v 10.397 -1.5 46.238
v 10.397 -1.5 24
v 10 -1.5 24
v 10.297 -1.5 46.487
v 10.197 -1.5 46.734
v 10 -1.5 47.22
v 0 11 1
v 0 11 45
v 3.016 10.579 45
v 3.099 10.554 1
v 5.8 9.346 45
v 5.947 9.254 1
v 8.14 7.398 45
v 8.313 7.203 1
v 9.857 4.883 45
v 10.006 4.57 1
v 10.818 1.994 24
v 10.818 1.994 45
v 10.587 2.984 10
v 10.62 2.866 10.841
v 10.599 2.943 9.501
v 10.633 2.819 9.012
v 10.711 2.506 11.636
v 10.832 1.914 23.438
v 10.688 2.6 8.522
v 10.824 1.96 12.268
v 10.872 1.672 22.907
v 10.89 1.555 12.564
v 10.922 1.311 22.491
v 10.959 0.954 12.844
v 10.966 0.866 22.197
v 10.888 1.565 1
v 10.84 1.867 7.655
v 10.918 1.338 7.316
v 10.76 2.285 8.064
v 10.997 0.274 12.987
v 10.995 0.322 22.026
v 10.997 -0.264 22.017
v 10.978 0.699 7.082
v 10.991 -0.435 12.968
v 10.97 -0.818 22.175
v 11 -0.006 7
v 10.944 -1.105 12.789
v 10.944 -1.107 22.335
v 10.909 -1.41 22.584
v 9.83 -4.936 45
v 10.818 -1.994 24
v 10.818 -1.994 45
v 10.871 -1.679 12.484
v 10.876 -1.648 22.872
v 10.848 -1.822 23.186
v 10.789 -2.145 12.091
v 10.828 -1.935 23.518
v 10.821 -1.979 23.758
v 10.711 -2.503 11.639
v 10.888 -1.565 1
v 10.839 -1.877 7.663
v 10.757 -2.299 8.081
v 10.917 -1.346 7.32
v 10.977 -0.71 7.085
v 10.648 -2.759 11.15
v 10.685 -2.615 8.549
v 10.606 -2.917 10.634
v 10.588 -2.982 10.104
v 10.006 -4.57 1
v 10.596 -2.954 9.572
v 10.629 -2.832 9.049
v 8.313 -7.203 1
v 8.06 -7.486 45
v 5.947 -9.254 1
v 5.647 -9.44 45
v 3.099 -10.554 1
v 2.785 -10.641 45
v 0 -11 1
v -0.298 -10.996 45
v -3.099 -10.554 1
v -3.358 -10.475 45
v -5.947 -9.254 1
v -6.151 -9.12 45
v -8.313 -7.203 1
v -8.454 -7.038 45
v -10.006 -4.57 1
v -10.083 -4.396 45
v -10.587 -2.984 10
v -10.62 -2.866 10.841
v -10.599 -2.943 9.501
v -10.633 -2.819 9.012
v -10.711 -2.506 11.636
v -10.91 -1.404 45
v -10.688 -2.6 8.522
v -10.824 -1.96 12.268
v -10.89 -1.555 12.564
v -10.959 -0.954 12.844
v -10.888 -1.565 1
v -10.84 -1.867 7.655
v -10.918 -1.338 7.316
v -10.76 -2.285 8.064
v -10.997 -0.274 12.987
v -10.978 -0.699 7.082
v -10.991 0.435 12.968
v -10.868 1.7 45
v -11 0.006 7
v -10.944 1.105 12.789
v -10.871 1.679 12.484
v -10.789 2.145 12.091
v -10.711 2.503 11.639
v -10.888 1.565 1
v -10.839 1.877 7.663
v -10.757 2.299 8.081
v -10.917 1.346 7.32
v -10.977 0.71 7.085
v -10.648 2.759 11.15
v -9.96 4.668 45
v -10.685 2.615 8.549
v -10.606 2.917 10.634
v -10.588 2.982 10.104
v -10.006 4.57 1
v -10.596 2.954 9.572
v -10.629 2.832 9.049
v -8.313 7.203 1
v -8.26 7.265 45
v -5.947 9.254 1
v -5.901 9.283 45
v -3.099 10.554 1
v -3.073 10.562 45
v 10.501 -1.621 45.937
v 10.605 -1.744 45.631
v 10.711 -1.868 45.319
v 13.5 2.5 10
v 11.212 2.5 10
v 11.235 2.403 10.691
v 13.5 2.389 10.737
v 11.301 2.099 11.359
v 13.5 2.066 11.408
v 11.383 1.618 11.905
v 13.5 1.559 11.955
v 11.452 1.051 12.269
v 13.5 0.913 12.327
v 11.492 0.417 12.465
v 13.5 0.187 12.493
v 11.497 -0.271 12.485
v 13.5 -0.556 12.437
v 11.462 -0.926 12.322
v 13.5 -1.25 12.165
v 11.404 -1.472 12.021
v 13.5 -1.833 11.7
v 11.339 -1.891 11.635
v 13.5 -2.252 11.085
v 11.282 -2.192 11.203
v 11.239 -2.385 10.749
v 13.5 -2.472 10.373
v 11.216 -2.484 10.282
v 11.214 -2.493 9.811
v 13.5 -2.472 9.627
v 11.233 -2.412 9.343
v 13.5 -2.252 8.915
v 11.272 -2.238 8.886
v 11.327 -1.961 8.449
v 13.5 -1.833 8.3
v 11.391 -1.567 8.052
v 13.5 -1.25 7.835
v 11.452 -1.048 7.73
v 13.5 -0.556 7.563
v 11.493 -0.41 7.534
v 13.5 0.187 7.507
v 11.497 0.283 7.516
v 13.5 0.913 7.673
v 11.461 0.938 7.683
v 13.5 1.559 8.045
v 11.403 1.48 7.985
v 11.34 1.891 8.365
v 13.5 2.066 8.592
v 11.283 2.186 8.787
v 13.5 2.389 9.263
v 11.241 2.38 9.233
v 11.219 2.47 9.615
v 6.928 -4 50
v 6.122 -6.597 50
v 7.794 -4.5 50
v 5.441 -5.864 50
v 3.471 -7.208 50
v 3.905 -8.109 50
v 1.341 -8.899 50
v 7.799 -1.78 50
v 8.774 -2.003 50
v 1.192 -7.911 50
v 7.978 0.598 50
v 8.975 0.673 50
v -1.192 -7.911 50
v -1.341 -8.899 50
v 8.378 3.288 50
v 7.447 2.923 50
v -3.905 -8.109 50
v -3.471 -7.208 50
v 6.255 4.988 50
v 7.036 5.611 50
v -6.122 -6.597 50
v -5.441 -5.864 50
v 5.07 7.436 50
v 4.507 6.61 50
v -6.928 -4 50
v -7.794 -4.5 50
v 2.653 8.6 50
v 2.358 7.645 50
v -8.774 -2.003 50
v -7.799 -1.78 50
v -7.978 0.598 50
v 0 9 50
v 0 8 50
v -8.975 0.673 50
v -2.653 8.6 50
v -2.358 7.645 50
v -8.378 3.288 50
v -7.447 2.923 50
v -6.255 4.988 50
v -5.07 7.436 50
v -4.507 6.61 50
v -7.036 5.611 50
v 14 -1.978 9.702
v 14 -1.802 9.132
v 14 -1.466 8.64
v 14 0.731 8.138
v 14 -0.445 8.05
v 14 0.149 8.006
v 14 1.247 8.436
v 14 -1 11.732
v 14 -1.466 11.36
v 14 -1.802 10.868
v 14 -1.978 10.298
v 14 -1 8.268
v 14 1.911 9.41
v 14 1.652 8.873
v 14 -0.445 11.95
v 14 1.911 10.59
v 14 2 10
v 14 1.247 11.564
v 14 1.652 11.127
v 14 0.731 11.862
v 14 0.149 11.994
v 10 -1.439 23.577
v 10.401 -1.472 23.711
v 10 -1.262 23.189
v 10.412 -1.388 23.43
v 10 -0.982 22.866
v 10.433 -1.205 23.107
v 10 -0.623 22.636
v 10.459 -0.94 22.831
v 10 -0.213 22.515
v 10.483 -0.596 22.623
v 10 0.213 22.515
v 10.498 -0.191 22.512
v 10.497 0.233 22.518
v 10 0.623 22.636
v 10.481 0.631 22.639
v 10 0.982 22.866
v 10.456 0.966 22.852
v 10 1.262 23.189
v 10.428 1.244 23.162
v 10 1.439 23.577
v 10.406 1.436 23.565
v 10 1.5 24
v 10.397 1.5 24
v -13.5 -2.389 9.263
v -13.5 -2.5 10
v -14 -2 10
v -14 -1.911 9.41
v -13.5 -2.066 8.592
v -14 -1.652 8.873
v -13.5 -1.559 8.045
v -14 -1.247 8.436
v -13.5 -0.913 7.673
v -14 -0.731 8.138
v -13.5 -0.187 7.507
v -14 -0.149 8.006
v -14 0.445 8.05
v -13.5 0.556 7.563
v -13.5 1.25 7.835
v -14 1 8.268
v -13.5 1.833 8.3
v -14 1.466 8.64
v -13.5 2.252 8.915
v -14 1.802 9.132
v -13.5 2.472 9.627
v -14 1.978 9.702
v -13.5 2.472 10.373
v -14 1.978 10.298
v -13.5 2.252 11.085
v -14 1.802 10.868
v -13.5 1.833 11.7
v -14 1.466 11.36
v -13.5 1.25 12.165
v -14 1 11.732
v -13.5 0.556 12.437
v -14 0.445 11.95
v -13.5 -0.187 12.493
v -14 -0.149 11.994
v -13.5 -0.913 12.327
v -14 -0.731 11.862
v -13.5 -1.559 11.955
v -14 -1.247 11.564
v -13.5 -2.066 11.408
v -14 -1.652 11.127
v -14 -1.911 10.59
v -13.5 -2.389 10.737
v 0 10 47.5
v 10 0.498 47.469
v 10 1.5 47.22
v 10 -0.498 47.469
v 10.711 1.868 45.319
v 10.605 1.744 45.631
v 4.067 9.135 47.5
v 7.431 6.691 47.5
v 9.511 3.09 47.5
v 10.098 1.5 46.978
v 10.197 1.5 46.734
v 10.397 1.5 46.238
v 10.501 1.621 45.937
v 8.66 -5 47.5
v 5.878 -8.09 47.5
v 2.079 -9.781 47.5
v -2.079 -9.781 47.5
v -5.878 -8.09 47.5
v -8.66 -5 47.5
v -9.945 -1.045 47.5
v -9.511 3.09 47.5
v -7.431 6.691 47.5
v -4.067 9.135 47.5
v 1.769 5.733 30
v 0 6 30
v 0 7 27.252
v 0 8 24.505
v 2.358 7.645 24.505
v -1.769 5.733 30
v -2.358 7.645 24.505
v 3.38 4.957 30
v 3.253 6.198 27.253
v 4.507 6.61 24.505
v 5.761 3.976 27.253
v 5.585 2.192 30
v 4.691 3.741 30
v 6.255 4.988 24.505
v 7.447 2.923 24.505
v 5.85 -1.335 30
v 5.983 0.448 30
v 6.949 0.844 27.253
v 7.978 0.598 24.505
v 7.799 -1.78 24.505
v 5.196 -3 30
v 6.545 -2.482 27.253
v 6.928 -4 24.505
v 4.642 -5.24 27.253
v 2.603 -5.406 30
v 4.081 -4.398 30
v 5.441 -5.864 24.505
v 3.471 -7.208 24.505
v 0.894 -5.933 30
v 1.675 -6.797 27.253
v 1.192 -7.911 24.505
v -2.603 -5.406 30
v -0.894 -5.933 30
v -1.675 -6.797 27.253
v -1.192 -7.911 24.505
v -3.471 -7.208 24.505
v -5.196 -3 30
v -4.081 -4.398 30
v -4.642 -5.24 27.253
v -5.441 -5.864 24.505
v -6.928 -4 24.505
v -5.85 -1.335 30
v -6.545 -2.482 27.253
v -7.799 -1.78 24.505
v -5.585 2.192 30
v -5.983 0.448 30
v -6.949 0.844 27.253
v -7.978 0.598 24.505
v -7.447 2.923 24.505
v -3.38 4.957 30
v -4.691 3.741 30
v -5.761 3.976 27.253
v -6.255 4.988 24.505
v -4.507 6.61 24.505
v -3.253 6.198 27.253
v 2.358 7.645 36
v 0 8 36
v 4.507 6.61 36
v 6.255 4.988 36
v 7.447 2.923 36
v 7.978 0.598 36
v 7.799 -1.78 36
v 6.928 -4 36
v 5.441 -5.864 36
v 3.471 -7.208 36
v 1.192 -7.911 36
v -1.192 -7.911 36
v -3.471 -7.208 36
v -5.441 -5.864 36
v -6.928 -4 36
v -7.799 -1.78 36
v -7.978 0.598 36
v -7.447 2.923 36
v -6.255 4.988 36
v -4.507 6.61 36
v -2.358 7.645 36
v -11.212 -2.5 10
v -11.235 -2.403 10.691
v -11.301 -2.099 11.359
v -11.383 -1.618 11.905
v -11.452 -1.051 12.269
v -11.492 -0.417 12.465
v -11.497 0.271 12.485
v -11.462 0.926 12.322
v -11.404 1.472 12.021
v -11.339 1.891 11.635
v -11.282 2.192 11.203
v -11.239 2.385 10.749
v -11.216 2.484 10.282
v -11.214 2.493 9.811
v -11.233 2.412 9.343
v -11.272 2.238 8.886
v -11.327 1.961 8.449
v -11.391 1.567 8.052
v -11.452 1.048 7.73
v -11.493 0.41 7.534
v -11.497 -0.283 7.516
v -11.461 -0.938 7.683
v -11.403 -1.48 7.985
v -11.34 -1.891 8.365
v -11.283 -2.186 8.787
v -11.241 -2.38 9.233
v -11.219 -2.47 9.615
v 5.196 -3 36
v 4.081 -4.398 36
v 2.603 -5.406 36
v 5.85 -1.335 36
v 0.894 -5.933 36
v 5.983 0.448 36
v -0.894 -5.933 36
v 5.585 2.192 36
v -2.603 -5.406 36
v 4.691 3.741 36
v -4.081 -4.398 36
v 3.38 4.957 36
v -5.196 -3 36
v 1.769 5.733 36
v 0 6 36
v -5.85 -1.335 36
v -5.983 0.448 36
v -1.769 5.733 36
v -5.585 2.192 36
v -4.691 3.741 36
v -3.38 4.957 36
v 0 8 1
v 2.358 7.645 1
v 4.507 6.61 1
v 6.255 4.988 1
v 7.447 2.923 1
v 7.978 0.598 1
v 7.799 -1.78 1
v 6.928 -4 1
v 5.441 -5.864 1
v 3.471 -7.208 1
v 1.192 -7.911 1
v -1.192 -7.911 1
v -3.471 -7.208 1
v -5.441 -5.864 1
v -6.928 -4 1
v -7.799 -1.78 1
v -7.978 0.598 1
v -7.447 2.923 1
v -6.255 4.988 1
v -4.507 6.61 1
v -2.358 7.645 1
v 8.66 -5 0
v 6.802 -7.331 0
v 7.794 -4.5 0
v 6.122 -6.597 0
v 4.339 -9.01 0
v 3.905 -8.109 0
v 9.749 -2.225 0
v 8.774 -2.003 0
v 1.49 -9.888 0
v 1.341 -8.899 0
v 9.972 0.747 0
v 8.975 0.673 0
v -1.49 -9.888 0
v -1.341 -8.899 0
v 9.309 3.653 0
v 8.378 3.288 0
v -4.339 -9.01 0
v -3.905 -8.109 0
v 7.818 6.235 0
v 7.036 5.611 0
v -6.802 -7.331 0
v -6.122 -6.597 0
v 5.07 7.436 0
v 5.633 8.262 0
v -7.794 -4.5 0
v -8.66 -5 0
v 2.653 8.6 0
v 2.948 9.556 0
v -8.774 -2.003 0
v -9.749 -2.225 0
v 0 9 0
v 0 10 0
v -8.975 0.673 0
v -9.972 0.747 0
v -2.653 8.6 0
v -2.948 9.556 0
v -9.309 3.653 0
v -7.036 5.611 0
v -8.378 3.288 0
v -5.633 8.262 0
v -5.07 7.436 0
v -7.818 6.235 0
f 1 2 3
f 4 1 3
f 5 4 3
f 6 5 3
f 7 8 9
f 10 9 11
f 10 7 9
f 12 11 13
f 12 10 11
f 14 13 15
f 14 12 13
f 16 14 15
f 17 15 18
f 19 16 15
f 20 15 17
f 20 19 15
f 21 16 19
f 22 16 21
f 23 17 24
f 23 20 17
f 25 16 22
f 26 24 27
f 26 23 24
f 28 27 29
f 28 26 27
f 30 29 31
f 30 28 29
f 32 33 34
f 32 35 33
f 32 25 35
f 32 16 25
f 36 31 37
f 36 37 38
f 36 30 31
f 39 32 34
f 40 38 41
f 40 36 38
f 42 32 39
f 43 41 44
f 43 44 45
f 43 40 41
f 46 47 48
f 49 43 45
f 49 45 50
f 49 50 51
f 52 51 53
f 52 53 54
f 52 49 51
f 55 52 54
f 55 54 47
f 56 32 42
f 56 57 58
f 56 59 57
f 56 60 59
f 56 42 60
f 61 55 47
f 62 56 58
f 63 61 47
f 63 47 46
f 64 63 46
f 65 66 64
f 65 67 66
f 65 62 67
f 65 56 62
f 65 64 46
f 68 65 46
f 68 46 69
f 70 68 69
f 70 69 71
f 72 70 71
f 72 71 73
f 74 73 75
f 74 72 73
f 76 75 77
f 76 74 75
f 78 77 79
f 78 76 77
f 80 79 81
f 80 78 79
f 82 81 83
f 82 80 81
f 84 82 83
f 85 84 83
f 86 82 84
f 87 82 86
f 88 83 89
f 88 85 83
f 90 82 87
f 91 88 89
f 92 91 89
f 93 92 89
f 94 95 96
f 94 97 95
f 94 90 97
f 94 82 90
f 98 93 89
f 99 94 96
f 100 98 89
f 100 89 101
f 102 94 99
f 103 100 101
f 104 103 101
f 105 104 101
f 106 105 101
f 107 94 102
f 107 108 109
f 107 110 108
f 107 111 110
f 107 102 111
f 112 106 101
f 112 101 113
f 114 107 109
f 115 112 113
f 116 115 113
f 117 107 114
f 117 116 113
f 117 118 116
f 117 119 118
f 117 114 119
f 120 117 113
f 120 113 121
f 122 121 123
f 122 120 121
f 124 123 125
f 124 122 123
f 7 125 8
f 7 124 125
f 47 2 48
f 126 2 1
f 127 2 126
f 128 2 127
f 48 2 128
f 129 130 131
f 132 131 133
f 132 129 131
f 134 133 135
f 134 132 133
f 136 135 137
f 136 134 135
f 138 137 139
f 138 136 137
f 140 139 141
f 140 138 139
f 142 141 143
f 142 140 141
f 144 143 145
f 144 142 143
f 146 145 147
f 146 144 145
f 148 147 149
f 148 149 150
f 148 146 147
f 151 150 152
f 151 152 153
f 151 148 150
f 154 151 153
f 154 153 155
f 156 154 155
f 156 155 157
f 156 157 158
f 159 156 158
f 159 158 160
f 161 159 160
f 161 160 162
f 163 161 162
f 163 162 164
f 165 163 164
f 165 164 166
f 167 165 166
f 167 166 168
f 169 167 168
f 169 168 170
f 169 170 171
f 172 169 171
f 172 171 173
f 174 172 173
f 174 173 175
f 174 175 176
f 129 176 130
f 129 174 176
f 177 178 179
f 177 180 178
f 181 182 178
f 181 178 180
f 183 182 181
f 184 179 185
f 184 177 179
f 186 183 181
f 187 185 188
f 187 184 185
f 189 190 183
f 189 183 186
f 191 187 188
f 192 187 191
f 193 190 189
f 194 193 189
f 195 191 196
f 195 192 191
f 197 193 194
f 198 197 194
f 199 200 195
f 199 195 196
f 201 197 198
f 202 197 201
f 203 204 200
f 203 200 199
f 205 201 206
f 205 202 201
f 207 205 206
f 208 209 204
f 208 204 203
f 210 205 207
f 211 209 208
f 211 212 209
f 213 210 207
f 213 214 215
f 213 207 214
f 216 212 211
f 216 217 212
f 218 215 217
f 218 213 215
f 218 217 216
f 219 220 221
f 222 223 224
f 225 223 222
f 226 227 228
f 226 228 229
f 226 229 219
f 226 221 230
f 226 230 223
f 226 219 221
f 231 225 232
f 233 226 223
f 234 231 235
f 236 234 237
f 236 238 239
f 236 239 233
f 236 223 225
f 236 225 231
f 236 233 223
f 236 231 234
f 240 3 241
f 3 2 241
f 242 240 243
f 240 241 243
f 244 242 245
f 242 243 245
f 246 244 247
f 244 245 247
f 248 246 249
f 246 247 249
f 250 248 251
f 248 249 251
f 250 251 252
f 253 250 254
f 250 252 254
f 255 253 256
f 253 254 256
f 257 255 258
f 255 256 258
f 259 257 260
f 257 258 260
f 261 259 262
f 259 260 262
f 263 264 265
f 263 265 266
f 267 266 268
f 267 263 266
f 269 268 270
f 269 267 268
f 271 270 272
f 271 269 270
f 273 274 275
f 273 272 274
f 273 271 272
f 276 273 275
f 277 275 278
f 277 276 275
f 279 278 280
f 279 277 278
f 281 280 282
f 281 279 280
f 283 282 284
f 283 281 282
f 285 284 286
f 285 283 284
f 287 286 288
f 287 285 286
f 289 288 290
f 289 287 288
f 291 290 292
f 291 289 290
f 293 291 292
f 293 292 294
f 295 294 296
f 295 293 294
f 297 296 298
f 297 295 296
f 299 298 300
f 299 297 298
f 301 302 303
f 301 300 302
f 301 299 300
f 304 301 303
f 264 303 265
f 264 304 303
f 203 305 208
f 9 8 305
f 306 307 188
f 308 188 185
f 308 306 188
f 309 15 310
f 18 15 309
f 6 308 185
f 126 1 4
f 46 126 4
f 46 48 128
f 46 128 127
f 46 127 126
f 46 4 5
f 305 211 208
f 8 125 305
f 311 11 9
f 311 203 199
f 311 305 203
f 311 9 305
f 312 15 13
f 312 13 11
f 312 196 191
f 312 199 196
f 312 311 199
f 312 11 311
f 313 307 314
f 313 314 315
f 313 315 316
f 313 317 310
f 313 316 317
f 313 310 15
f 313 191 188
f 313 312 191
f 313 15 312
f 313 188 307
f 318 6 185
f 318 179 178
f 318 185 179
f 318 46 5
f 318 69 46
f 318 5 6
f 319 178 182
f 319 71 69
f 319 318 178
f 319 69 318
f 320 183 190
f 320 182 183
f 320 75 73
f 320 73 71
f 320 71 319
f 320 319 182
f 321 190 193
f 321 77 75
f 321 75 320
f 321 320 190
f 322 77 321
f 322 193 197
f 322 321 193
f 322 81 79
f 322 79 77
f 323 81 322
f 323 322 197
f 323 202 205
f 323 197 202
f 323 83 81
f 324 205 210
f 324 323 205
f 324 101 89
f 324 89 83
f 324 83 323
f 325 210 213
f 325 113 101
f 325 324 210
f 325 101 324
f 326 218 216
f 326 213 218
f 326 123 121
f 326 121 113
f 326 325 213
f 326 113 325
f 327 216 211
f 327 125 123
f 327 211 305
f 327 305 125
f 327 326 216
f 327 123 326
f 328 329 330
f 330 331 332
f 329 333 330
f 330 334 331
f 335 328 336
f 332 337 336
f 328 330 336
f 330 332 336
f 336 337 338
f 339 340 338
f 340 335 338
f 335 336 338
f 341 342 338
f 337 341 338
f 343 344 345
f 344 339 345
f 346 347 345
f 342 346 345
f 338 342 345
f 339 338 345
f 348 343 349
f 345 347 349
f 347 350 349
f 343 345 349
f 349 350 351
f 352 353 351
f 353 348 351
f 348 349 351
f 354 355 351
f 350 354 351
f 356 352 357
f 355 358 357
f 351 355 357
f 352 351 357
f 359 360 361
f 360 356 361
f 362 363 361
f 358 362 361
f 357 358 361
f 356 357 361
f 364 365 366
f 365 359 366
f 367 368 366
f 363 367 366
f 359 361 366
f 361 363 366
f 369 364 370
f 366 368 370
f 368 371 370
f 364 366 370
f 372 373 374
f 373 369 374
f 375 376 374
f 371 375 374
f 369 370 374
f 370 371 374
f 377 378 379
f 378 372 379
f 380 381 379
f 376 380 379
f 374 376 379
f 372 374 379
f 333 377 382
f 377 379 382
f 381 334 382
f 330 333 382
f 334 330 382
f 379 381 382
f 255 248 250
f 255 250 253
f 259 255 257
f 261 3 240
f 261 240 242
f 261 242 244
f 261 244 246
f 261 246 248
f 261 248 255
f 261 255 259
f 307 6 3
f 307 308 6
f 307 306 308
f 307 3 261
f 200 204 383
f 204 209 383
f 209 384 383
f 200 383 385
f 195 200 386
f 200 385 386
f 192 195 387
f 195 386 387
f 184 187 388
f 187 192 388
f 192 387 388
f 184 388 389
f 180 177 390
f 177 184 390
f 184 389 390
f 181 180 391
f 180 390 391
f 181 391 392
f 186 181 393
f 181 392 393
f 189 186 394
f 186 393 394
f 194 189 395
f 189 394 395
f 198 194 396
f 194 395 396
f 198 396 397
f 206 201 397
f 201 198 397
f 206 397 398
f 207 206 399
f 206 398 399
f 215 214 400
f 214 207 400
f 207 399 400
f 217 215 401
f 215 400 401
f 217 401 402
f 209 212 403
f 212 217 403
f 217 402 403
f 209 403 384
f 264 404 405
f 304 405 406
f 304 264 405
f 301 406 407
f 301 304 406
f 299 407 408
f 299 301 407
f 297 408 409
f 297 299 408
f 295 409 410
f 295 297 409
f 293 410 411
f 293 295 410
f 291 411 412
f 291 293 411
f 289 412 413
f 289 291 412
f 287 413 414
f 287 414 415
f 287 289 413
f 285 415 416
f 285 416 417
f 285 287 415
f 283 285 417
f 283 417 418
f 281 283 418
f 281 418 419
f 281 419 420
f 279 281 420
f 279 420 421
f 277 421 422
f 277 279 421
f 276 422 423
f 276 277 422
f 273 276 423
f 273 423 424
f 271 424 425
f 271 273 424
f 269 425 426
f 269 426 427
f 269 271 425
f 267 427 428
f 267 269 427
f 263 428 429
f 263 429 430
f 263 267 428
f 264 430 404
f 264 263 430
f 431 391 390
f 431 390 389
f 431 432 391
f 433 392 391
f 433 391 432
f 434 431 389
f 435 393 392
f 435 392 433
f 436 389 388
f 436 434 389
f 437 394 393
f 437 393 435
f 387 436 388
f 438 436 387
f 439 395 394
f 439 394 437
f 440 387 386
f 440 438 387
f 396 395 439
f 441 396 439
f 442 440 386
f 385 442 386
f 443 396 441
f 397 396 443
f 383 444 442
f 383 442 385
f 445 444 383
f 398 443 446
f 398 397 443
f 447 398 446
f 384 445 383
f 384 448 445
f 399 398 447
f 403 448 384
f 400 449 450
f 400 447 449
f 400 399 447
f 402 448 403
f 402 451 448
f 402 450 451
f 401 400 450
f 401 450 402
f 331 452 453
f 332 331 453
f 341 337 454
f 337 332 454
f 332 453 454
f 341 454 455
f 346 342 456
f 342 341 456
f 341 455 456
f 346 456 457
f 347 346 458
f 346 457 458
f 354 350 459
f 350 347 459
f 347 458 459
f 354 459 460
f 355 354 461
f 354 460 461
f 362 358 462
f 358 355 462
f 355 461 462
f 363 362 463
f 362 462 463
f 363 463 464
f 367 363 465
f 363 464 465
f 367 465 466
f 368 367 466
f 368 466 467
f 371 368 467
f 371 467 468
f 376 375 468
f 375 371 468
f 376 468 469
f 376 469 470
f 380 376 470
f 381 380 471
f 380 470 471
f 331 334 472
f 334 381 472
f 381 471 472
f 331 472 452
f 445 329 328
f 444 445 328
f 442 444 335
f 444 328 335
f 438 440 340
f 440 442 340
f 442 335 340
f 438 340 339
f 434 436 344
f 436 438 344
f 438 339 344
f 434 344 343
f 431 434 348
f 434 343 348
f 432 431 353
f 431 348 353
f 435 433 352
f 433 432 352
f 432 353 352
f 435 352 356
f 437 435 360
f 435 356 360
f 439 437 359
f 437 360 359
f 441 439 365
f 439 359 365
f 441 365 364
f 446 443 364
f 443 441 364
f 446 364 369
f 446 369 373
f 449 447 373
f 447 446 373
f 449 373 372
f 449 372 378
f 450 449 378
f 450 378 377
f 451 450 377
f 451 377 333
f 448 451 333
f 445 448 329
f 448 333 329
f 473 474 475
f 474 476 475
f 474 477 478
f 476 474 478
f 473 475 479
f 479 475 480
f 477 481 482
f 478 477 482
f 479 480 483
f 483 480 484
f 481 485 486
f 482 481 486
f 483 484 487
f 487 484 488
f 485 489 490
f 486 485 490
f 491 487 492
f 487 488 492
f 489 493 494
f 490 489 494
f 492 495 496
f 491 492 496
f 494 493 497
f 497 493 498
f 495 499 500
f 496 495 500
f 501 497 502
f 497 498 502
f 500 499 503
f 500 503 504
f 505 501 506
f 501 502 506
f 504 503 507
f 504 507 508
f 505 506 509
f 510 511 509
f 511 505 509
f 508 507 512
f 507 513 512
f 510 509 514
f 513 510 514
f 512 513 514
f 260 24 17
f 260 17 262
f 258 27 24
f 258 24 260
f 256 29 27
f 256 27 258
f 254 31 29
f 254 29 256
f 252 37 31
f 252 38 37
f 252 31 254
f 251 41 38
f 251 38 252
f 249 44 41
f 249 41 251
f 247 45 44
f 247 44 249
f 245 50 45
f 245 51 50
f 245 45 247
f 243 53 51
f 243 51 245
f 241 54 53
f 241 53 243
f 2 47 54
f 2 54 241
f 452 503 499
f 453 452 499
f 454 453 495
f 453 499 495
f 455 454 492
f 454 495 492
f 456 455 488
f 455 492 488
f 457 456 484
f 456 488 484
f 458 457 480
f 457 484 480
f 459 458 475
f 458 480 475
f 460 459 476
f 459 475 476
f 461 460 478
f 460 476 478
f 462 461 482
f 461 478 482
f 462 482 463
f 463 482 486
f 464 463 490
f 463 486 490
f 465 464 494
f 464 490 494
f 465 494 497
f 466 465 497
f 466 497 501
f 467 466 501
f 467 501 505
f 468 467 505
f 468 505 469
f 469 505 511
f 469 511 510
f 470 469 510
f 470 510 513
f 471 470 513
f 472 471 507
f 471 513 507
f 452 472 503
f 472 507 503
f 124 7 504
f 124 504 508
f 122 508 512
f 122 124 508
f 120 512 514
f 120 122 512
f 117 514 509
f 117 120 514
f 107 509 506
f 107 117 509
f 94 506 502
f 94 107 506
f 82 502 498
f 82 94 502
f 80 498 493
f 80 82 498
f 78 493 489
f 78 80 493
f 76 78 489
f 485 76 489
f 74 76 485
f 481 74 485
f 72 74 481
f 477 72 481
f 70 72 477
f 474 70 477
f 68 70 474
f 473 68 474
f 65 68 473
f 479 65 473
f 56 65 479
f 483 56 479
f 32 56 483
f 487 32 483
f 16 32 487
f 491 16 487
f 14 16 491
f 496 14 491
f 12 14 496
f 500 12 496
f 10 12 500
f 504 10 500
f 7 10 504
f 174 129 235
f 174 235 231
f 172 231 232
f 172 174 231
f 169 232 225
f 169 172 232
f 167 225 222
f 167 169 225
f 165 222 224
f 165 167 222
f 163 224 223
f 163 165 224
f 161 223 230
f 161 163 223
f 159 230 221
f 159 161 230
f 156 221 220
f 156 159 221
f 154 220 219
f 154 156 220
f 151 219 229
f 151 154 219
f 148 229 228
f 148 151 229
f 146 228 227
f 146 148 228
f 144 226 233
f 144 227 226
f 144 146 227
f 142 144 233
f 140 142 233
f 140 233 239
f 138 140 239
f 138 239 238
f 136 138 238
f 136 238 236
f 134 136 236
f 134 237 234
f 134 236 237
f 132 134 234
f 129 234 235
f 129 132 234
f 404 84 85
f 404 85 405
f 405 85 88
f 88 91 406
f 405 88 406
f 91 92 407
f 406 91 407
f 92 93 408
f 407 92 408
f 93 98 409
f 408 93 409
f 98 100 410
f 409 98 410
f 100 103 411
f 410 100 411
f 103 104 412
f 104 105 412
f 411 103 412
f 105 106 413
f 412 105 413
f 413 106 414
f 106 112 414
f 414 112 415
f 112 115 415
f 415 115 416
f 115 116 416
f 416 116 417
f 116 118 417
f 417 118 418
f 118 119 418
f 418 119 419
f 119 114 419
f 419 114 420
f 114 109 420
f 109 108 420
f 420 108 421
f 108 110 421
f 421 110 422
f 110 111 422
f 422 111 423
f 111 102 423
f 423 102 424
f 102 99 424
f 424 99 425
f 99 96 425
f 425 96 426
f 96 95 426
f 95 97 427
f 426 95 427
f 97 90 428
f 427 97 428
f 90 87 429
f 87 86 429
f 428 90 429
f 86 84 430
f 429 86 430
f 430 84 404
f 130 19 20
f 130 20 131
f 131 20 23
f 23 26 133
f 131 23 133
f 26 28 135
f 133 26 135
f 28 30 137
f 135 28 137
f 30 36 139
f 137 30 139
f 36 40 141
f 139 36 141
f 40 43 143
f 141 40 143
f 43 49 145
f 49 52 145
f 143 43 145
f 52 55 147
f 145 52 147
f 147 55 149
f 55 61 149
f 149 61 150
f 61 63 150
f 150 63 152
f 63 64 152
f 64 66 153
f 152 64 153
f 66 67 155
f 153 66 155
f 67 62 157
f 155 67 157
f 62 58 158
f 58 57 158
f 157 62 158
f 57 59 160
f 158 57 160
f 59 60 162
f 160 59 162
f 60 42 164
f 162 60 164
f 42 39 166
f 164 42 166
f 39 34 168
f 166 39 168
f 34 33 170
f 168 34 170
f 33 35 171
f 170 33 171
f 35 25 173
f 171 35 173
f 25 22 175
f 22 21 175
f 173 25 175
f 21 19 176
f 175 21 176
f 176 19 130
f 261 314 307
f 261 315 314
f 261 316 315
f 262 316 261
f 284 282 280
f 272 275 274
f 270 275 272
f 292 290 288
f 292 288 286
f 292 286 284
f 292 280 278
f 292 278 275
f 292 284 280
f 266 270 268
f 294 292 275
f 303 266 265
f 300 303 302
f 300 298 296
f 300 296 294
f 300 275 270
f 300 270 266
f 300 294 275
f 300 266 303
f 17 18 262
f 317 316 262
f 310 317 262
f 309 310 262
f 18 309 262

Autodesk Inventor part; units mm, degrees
ref_plane "XZ Plane" through (0, 0, 0) normal (0, 1, 0) x (-1, 0, 0)
sketch "Esquisse1" plane through (0, 0, 0) normal (1, 0, 0) x (0, 1, 0)
  line L0 (0, 0) -> (0, 17.1522)
  line L1 (8, 50) -> (8, 36)
  line L2 (8, 36) -> (6, 36)
  line L3 (6, 36) -> (6, 30)
  line L4 (6, 30) -> (8, 24.505)
  line L5 (8, 24.505) -> (8, 1)
  line L6 (8, 1) -> (9, 0)
  line L7 (9, 0) -> (10, 0)
  line L8 (8, 50) -> (9, 50)
  line L9 (9, 50) -> (11, 45)
  line L10 (11, 45) -> (11, 1)
  line L11 (11, 1) -> (10, 0)
  dimension "d0" = 160
  dimension "d1" = 6
  dimension "d2" = 14
  dimension "d4" = 16
  dimension "d6" = 16
  dimension "d8" = 1
  dimension "d9" = 1
  dimension "d10" = 30
  dimension "d11" = 1
  dimension "d12" = 2
  dimension "d13" = 22
  dimension "d14" = 3
  dimension "d15" = 5
  dimension "d19" = 1
  dimension "d20" = 1
revolve "Révolution1" add sketch "Esquisse1" angle 360 about axis through (0, 0, 0) along (0, 0, 1)
thread "Filetage1" size "M16x2" class "6H" standard "ISO Metric profile" full length
ref_plane "Plan de construction2" through (14, 0, 0) normal (1, 0, 0) x (0, 1, 0)
sketch "Esquisse2" plane through (14, 0, 0) normal (1, 0, 0) x (0, 1, 0)
  circle A0 centre (0, 10) radius 2.5
  point P0 (0, 0)
  dimension "d22" = 5
  dimension "d23" = 10
extrude "Extrusion1" add sketch "Esquisse2" against normal up to surface
chamfer "Chanfrein1" distance 0.5 angle 45 2 edges at (10.7122, -2.5, 10.0138) (14, -2.5, 10)
pattern_circular "Réseau circulaire1" count 2 over 360 about axis through (0, 0, -10) along (0, 0, 1) of "Extrusion1", "Chanfrein1"
ref_plane "Plan de construction3" through (11, 0, 23) normal (1, 0, 0) x (0, 1, 0)
sketch "Esquisse4" plane through (11, 0, 23) normal (1, 0, 0) x (0, 1, 0)
  line L0 (0, 31) -> (0, 1) construction
  line L1 (1.5, 31) -> (1.5, 1)
  line L2 (-1.5, 1) -> (-1.5, 31)
  arc A0 (1.5, 31) -> (-1.5, 31) centre (0, 31) ccw
  arc A1 (-1.5, 1) -> (1.5, 1) centre (0, 1) ccw
  line L3 (-11, 22) -> (11, 22) projected
  point P0 (0, -23)
  point P1 (0, 16)
  dimension "d39" = 1.5
  dimension "d40" = 30
  dimension "d47" = 24
extrude "Extrusion2" cut sketch "Esquisse4" against normal blind 1
chamfer "Chanfrein3" distance 0.5 angle 45 4 edges at (10.8972, 1.5, 34.5) (10.9487, -1.0614, 22.9401) (10.9417, 1.131, 23.0147) (10.8972, -1.5, 34.5)
properties part number "support_douille" material "Aluminium 6061"
